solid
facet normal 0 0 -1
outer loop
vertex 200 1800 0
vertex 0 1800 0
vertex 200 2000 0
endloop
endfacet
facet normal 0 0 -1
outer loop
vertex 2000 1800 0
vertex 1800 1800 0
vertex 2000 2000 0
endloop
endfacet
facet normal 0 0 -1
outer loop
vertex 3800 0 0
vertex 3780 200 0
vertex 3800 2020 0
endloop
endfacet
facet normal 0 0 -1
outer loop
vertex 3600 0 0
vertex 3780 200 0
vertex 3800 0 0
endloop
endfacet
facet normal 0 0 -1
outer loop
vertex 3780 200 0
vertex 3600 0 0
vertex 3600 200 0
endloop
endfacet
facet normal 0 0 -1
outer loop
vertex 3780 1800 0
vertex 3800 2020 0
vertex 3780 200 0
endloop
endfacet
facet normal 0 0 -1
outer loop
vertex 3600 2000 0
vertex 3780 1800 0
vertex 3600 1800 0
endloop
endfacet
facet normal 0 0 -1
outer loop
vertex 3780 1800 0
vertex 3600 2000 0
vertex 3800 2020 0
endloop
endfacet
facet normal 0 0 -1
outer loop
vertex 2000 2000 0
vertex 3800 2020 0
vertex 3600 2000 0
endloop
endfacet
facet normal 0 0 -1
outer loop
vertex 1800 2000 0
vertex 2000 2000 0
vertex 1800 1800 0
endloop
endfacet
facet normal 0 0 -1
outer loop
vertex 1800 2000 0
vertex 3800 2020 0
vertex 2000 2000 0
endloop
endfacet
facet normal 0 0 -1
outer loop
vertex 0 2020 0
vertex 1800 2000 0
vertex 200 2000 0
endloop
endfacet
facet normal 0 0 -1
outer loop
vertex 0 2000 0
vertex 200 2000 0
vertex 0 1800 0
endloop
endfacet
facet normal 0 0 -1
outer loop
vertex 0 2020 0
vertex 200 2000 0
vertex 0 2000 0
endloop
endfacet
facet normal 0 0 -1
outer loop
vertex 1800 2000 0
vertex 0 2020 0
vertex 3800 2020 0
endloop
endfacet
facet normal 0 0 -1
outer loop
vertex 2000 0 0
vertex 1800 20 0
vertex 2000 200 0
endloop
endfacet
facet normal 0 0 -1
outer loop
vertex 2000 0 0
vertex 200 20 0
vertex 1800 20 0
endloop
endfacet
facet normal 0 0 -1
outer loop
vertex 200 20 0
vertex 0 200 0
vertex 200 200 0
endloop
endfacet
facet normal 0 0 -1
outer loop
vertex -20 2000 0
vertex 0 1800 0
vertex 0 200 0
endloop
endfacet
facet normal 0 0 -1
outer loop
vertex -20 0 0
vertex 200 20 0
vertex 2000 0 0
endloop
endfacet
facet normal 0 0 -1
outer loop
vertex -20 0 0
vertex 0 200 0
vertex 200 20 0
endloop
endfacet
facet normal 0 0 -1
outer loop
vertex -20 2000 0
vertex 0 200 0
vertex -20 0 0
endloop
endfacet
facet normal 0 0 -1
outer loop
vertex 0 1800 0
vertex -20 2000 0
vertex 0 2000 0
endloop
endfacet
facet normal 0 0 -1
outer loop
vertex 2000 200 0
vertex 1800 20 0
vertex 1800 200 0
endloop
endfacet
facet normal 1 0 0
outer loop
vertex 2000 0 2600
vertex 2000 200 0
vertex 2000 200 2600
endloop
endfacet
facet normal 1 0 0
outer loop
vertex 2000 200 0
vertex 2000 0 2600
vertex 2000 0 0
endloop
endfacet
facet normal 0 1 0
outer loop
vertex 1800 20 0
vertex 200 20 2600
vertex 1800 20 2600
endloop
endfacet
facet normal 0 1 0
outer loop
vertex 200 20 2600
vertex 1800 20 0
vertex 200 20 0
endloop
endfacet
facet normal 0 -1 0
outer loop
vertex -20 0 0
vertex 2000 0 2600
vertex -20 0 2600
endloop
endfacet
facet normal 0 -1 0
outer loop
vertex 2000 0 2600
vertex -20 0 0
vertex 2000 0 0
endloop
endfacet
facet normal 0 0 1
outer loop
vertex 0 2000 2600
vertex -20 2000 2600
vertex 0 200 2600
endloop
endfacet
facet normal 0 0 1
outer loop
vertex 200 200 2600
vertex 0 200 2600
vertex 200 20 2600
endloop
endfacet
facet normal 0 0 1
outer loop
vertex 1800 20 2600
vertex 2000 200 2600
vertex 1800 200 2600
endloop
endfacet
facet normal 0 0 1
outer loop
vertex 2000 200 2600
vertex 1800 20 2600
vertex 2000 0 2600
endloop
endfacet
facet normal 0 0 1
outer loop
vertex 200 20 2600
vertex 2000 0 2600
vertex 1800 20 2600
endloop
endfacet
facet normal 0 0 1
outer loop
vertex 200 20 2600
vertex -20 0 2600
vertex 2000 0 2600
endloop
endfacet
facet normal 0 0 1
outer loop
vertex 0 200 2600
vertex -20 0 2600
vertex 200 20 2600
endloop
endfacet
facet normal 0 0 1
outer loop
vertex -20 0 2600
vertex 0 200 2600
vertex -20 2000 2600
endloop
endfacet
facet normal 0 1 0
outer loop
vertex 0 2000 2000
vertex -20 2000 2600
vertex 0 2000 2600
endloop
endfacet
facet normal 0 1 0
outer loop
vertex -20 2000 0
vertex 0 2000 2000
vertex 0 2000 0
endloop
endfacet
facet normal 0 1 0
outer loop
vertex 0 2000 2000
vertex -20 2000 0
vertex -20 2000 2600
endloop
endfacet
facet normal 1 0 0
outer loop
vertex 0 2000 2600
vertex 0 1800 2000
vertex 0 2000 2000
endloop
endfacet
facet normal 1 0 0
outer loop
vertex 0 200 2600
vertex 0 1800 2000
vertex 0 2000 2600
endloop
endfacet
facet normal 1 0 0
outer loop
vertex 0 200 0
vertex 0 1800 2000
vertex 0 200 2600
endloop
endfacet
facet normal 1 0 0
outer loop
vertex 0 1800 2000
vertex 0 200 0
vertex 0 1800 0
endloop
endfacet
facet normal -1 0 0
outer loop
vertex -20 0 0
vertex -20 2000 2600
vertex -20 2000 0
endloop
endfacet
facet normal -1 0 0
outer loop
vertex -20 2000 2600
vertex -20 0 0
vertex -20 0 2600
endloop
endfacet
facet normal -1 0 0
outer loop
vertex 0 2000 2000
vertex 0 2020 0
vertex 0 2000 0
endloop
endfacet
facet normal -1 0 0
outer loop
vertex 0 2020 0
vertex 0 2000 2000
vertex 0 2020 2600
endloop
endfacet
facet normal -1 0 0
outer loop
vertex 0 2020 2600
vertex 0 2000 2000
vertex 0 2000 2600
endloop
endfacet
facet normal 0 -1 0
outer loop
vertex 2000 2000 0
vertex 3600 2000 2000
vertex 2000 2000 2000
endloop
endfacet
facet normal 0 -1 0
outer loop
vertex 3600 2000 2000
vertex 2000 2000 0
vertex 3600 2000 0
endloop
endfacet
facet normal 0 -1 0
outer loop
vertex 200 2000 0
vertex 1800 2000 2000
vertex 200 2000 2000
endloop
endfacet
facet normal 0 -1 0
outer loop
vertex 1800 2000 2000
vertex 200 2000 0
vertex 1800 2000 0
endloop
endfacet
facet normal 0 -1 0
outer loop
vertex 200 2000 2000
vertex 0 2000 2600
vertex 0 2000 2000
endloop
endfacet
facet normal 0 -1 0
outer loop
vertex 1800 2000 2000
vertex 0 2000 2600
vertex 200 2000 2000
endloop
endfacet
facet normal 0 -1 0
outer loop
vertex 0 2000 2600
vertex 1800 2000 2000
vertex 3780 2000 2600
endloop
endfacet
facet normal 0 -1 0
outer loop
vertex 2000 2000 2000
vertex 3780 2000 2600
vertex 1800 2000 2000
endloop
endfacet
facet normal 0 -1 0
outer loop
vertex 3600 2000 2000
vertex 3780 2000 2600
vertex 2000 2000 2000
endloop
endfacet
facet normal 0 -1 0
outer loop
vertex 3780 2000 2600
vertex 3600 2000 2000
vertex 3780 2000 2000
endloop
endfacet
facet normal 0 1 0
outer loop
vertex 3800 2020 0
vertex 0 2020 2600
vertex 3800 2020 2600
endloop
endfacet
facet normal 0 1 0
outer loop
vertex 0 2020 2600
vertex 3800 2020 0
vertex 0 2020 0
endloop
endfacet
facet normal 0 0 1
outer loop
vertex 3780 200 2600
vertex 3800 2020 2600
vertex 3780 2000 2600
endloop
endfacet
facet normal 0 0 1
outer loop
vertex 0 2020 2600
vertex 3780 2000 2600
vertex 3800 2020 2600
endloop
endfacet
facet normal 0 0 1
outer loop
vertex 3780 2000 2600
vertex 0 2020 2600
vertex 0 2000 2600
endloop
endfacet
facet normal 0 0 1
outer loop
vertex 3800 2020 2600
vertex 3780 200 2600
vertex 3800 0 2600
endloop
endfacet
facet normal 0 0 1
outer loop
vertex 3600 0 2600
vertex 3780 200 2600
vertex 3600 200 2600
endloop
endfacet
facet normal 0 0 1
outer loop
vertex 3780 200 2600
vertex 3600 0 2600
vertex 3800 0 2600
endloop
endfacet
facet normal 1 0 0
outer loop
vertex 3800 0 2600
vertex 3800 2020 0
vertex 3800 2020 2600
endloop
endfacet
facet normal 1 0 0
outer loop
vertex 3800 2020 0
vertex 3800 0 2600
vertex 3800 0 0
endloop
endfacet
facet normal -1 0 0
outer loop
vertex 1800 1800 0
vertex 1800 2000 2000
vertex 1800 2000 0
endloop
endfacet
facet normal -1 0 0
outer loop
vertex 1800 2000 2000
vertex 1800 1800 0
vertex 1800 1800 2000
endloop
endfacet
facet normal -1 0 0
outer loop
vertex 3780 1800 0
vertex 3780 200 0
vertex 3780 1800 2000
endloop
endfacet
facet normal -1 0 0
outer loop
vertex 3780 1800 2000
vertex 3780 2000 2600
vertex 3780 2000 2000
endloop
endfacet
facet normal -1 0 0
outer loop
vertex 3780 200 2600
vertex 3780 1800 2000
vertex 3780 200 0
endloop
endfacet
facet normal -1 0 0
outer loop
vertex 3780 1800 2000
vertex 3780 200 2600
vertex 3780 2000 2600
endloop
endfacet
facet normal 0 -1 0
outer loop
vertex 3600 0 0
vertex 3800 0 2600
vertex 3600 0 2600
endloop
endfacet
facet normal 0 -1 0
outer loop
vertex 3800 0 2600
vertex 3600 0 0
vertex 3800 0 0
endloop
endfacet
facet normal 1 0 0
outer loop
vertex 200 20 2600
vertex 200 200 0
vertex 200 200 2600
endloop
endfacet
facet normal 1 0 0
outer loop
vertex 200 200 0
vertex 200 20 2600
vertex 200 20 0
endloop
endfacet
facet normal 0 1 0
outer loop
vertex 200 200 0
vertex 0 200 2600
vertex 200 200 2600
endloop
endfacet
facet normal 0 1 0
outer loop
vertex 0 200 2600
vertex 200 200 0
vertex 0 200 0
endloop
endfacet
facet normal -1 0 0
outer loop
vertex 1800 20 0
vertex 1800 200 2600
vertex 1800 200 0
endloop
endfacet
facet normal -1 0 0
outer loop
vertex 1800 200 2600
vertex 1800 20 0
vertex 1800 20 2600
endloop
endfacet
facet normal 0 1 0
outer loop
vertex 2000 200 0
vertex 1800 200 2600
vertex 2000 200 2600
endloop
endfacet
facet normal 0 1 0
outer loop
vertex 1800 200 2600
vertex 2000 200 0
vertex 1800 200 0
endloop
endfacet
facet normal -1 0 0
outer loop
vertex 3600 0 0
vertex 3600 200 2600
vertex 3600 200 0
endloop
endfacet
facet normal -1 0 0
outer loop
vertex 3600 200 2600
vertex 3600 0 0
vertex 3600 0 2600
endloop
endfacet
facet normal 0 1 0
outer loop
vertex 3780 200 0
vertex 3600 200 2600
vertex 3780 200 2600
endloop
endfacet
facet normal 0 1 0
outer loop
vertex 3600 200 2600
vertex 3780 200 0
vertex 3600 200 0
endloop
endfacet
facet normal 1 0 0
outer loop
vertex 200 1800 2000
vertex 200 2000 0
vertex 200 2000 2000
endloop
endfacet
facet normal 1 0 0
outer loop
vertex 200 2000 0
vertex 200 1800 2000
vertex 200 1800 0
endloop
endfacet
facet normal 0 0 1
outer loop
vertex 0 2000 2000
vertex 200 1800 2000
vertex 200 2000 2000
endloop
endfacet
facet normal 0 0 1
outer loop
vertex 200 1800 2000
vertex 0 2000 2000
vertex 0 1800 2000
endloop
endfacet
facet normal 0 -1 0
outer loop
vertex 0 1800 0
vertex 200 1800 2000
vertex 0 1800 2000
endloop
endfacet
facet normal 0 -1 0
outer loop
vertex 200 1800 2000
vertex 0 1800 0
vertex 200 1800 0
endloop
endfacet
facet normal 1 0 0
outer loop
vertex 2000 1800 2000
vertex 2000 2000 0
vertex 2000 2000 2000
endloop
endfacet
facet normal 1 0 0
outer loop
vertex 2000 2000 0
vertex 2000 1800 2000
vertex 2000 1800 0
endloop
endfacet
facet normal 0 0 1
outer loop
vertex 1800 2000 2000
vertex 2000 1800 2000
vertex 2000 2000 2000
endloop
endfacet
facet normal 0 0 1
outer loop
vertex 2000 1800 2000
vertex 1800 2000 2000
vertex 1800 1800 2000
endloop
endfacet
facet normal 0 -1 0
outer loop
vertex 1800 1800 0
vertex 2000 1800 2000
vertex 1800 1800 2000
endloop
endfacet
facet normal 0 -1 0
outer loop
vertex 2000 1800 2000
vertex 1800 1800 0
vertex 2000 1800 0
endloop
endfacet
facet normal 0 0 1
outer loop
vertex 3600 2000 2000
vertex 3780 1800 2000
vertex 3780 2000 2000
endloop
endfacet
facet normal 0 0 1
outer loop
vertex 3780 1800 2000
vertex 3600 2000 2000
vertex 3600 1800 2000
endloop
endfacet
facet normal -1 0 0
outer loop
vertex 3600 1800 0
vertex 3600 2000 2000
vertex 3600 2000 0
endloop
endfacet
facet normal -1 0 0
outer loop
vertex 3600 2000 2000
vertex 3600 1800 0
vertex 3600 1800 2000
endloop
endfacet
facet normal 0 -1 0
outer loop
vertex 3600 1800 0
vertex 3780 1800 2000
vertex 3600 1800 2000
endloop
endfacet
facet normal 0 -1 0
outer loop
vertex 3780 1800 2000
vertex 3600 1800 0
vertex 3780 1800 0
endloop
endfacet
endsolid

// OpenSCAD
/*
 * Sheep shelter
 * Author: Michal Konecny
 */

// All measurements are in mm

// width, height, length
column=[200,200,2000];
higher_column=[200,200,2600];
plank=[200,20,2000];

// create all six columns first
cube(higher_column);
translate([1800,0,0])
  cube(higher_column);
translate([2*1800,0,0])
  cube(higher_column);
translate([0,1800,0])
  cube(column);
translate([1800,1800,0])
  cube(column);
translate([2*1800,1800,0])
  cube(column);

coverSide(0,0,0,0);
coverSide(0,0,0,90);
coverSide(0,2000,0,0);
coverSide(1800,2000,0,0);
coverSide(3800,0,0,90);


// cover one side with planks
module coverSide(x,y,z, angle){
  for (i = [z : plank[0] : higher_column[2]-plank[0]]){
  translate([x,y,i+plank[0]])
    rotate([0,90,angle])
      cube(plank);
  }
}
